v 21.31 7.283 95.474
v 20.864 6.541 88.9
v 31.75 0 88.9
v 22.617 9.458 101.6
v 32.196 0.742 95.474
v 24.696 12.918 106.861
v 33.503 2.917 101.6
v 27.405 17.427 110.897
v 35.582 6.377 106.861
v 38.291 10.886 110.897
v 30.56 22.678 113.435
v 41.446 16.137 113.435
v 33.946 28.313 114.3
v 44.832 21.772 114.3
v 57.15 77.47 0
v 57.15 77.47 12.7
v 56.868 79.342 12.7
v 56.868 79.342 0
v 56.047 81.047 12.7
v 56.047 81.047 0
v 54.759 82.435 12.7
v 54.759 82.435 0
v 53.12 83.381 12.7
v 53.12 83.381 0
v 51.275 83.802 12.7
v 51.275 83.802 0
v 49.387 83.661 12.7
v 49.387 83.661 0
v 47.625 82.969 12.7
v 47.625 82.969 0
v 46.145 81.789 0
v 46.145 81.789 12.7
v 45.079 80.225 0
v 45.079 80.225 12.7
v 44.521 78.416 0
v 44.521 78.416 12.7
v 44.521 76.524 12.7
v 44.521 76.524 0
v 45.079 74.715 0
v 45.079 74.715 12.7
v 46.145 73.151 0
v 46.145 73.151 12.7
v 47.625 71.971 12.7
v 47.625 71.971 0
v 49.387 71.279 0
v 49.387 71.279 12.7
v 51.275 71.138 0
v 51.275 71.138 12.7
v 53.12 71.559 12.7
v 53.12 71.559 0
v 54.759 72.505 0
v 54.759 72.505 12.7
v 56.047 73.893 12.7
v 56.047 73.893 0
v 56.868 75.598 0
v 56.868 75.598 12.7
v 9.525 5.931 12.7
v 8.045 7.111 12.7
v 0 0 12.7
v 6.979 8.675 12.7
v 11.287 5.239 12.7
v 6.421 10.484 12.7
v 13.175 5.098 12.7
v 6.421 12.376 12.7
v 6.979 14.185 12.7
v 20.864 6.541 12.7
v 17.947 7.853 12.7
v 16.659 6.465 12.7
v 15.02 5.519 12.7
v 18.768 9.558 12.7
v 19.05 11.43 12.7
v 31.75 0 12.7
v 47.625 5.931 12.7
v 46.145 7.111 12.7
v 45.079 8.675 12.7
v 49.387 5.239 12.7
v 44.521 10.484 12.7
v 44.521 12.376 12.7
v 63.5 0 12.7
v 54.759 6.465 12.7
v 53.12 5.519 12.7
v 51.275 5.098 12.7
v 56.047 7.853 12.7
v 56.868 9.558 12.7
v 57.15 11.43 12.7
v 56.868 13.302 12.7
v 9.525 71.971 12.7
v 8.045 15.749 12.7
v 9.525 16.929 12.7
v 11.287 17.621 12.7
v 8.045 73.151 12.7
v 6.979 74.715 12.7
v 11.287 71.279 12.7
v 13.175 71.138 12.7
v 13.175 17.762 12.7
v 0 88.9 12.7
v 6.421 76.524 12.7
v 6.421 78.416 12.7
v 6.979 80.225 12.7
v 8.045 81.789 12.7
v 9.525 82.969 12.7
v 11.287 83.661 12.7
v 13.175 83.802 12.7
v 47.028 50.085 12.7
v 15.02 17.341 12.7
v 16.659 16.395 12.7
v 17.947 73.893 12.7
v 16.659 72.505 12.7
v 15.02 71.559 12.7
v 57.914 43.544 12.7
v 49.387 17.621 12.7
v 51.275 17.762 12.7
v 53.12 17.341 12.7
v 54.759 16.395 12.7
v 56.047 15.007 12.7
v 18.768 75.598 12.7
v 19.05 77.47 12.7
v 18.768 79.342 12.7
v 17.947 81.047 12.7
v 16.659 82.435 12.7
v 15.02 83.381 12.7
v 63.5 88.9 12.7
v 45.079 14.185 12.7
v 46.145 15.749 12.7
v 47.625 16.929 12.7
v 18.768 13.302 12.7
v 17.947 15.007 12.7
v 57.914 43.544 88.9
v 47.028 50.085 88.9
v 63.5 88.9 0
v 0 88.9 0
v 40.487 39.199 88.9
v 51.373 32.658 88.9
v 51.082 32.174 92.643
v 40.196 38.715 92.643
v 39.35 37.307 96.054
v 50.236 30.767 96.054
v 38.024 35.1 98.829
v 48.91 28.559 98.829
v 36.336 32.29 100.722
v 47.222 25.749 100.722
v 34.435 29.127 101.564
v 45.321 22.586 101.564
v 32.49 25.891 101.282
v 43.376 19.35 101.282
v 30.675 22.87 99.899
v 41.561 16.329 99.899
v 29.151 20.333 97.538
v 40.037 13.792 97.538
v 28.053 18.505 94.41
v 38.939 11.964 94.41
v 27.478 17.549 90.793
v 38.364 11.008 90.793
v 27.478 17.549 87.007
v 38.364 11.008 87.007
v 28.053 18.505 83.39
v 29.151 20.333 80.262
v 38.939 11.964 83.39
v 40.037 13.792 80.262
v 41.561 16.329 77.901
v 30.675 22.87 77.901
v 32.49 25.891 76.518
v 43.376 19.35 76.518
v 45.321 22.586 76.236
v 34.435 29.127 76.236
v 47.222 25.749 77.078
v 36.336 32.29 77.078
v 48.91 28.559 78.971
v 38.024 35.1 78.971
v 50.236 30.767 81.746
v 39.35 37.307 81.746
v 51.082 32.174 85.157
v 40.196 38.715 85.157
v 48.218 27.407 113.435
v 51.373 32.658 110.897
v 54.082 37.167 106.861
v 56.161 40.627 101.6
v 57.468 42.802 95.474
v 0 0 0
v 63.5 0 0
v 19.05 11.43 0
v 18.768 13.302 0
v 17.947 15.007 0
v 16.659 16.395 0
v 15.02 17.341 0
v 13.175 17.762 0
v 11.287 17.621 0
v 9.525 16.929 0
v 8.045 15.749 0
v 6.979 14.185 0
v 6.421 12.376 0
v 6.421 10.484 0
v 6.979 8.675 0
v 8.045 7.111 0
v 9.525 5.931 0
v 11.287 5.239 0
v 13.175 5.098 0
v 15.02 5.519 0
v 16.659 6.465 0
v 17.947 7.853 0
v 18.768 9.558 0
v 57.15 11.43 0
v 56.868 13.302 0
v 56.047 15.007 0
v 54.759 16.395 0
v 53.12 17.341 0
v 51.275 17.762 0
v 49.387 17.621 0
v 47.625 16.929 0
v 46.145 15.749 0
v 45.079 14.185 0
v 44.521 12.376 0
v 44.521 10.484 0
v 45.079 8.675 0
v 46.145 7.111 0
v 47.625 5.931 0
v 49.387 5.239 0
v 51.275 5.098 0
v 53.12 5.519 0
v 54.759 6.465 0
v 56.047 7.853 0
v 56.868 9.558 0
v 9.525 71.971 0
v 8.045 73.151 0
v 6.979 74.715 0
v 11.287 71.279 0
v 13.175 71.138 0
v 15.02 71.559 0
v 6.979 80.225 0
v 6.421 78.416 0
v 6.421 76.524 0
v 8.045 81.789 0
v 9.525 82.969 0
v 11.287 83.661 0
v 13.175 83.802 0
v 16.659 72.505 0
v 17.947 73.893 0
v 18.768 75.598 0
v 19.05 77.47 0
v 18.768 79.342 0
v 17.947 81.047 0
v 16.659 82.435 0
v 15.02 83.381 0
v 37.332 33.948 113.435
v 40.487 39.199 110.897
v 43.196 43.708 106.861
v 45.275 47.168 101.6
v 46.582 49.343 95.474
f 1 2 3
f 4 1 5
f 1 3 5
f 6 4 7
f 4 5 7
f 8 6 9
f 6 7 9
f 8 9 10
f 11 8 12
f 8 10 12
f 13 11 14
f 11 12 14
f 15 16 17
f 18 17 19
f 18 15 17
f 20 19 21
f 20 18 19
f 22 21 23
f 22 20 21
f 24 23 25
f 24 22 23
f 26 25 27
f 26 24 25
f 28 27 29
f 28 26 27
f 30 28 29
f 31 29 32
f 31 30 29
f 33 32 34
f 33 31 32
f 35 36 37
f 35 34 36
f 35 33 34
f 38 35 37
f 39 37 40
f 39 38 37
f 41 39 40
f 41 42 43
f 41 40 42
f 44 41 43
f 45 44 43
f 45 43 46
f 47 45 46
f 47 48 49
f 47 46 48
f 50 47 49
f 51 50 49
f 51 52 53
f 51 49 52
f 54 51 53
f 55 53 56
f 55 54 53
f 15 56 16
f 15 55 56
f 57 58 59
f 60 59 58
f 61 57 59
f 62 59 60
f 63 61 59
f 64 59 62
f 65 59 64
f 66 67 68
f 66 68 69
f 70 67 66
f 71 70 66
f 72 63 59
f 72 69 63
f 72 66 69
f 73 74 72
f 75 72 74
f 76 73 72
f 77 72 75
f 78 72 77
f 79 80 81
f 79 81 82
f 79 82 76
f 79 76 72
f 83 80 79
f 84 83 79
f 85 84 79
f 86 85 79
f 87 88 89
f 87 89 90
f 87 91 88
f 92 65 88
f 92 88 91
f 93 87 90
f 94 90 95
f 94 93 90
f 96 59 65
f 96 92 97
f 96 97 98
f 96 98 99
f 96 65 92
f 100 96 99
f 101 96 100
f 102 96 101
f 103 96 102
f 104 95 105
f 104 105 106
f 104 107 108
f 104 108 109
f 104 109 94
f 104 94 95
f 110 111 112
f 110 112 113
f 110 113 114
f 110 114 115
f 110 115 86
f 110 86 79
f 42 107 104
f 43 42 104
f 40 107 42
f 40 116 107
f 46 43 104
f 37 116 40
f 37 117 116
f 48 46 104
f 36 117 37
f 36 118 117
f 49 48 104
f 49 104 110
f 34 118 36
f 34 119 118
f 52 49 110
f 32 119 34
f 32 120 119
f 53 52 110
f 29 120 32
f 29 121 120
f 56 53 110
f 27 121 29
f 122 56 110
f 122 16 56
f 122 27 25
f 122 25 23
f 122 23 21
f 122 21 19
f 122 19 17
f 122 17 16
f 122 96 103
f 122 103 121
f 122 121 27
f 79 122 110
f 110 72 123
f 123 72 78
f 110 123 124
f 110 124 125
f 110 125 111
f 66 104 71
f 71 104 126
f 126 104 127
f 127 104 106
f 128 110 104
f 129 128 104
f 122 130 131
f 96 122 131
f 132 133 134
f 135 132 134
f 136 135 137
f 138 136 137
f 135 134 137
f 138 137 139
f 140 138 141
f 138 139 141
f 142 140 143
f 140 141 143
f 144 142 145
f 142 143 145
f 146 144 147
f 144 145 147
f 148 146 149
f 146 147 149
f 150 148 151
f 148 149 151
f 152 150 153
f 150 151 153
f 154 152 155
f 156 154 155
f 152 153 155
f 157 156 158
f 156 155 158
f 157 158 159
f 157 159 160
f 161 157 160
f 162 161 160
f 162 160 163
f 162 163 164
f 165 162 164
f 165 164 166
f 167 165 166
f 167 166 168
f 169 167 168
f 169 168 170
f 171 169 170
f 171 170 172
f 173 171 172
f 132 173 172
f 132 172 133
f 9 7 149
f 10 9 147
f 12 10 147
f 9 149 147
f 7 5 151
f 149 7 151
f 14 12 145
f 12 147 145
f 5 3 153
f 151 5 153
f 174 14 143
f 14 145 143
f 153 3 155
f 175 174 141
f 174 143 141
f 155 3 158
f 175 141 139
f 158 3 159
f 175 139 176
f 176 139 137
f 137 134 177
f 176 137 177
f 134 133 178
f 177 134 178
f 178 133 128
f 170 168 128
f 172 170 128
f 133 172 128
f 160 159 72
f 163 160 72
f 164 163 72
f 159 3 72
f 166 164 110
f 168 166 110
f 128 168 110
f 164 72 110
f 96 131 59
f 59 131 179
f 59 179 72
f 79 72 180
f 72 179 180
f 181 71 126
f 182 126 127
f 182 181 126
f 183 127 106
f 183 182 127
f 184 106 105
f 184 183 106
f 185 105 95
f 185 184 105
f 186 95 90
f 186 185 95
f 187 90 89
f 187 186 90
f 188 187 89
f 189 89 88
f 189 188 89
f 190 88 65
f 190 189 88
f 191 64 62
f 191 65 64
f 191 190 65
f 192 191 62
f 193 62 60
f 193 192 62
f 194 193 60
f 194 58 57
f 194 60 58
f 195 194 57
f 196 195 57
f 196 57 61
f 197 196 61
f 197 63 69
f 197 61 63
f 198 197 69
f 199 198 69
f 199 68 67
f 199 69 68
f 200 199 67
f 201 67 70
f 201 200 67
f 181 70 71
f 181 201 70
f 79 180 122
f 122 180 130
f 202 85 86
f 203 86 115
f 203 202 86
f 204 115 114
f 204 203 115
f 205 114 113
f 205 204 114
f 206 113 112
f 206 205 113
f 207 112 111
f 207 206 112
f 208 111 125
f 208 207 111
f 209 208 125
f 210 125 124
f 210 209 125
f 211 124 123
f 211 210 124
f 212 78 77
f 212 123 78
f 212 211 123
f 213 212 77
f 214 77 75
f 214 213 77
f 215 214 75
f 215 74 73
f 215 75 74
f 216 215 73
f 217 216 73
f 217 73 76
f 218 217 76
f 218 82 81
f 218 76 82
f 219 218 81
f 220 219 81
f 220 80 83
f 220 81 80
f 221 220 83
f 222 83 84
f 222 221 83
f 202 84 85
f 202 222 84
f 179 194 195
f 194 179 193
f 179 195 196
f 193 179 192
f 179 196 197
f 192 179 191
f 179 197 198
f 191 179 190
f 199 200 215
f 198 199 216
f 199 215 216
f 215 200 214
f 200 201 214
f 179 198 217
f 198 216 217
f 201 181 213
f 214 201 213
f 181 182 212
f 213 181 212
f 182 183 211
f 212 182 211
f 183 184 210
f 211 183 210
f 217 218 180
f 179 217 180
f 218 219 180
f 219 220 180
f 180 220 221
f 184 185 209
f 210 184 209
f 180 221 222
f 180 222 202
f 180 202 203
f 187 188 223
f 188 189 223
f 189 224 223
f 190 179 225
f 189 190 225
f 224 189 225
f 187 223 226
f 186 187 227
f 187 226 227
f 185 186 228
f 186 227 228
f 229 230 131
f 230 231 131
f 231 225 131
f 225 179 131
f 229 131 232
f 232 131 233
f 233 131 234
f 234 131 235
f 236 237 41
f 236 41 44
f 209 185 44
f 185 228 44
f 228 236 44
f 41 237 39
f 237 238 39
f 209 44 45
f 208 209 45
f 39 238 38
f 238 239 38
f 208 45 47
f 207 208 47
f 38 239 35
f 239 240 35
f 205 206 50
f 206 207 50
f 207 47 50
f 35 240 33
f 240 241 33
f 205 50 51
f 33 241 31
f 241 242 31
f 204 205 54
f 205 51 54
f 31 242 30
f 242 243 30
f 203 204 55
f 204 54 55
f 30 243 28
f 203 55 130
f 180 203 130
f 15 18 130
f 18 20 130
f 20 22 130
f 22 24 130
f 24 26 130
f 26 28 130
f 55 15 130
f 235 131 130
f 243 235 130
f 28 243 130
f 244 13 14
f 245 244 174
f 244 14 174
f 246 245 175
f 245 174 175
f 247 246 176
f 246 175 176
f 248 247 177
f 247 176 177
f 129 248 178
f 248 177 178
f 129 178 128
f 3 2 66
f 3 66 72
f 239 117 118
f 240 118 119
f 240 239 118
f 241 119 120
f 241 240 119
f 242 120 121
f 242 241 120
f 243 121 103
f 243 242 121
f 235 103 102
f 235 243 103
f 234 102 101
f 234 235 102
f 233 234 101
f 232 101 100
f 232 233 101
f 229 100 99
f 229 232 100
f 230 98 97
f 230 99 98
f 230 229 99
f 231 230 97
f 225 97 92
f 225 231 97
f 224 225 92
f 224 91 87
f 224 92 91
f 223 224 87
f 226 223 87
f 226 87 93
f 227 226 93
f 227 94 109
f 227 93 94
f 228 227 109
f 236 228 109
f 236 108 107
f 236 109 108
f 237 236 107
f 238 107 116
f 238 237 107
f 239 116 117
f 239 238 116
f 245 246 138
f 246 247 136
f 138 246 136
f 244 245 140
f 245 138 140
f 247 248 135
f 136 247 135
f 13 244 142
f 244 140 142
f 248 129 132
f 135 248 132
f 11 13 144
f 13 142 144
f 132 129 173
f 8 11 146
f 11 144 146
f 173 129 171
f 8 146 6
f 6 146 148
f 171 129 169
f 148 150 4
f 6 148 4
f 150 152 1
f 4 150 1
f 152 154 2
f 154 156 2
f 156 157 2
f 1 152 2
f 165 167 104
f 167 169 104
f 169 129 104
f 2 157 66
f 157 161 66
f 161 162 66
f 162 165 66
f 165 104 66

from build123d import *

# Parameters (mm, degrees)
F0_R     = 6.35
F1_DEPTH = 12.7
F2_DEPTH = 114.3
F4_DEPTH = 73.0029466568
F3_R     = 12.7
F5_DEPTH = 73.0029466568
F6_DEPTH = 114.301


with BuildPart() as f1:
    # F0 (on Top) → F1 (new body)
    with BuildSketch(Plane.XY):
        Polygon((0, 88.9), (0, 0), (31.75, 0), (63.5, 0), (63.5, 88.9), align=None)
        with Locations((12.7, 11.43)):
            Circle(F0_R, mode=Mode.SUBTRACT)
        with Locations((50.8, 11.43)):
            Circle(F0_R, mode=Mode.SUBTRACT)
        Polygon((57.9139342054, 43.5440988757), (31.75, 0), (20.8639752811, 6.5409835514), (47.0279094865, 50.085082427), align=None, mode=Mode.SUBTRACT)
        with Locations((12.7, 77.47)):
            Circle(F0_R, mode=Mode.SUBTRACT)
        with Locations((50.8, 77.47)):
            Circle(F0_R, mode=Mode.SUBTRACT)
        with Locations((50.8, 77.47)):
            Circle(F0_R)
        with Locations((12.7, 77.47)):
            Circle(F0_R)
        Polygon((20.8639752811, 6.5409835514), (31.75, 0), (57.9139342054, 43.5440988757), (47.0279094865, 50.085082427), align=None)
        with Locations((50.8, 11.43)):
            Circle(F0_R)
        with Locations((12.7, 11.43)):
            Circle(F0_R)
    extrude(amount=F1_DEPTH)

    # F0 (on Top) → F2 (join)
    with BuildSketch(Plane.XY):
        Polygon((20.8639752811, 6.5409835514), (31.75, 0), (57.9139342054, 43.5440988757), (47.0279094865, 50.085082427), align=None)
    extrude(amount=F2_DEPTH)

    # F3 (on face) → F4 (cut, through all)
    with BuildSketch(Plane(origin=(23.3278610592, -14.0167930366, 0), x_dir=(0.5150380749, 0.8571673007, 0), z_dir=(0.8571673007, -0.5150380749, 0))):
        with BuildLine():
            Line((16.3524588784, 114.3), (16.3524588784, 88.9))
            ThreePointArc((16.3524588784, 88.9), (23.7919466363, 106.8605122421), (41.7524588784, 114.3))
            Line((41.7524588784, 114.3), (16.3524588784, 114.3))
        make_face()
        with BuildLine():
            Line((67.1524588784, 114.3), (41.7524588784, 114.3))
            ThreePointArc((41.7524588784, 114.3), (59.7129711205, 106.8605122421), (67.1524588784, 88.9))
            Line((67.1524588784, 88.9), (67.1524588784, 114.3))
        make_face()
    extrude(amount=-F4_DEPTH, mode=Mode.SUBTRACT)

    # F3 (on face) → F5 (cut, through all)
    with BuildSketch(Plane(origin=(23.3278610592, -14.0167930366, 0), x_dir=(0.5150380749, 0.8571673007, 0), z_dir=(0.8571673007, -0.5150380749, 0))):
        with Locations((41.7524588784, 88.9)):
            Circle(F3_R)
    extrude(amount=-F5_DEPTH, mode=Mode.SUBTRACT)

    # F0 (on Top) → F6 (cut, through all)
    with BuildSketch(Plane.XY):
        with Locations((50.8, 11.43)):
            Circle(F0_R)
        with Locations((50.8, 77.47)):
            Circle(F0_R)
        with Locations((12.7, 77.47)):
            Circle(F0_R)
        with Locations((12.7, 11.43)):
            Circle(F0_R)
    extrude(amount=F6_DEPTH, mode=Mode.SUBTRACT)


solid = f1.part
